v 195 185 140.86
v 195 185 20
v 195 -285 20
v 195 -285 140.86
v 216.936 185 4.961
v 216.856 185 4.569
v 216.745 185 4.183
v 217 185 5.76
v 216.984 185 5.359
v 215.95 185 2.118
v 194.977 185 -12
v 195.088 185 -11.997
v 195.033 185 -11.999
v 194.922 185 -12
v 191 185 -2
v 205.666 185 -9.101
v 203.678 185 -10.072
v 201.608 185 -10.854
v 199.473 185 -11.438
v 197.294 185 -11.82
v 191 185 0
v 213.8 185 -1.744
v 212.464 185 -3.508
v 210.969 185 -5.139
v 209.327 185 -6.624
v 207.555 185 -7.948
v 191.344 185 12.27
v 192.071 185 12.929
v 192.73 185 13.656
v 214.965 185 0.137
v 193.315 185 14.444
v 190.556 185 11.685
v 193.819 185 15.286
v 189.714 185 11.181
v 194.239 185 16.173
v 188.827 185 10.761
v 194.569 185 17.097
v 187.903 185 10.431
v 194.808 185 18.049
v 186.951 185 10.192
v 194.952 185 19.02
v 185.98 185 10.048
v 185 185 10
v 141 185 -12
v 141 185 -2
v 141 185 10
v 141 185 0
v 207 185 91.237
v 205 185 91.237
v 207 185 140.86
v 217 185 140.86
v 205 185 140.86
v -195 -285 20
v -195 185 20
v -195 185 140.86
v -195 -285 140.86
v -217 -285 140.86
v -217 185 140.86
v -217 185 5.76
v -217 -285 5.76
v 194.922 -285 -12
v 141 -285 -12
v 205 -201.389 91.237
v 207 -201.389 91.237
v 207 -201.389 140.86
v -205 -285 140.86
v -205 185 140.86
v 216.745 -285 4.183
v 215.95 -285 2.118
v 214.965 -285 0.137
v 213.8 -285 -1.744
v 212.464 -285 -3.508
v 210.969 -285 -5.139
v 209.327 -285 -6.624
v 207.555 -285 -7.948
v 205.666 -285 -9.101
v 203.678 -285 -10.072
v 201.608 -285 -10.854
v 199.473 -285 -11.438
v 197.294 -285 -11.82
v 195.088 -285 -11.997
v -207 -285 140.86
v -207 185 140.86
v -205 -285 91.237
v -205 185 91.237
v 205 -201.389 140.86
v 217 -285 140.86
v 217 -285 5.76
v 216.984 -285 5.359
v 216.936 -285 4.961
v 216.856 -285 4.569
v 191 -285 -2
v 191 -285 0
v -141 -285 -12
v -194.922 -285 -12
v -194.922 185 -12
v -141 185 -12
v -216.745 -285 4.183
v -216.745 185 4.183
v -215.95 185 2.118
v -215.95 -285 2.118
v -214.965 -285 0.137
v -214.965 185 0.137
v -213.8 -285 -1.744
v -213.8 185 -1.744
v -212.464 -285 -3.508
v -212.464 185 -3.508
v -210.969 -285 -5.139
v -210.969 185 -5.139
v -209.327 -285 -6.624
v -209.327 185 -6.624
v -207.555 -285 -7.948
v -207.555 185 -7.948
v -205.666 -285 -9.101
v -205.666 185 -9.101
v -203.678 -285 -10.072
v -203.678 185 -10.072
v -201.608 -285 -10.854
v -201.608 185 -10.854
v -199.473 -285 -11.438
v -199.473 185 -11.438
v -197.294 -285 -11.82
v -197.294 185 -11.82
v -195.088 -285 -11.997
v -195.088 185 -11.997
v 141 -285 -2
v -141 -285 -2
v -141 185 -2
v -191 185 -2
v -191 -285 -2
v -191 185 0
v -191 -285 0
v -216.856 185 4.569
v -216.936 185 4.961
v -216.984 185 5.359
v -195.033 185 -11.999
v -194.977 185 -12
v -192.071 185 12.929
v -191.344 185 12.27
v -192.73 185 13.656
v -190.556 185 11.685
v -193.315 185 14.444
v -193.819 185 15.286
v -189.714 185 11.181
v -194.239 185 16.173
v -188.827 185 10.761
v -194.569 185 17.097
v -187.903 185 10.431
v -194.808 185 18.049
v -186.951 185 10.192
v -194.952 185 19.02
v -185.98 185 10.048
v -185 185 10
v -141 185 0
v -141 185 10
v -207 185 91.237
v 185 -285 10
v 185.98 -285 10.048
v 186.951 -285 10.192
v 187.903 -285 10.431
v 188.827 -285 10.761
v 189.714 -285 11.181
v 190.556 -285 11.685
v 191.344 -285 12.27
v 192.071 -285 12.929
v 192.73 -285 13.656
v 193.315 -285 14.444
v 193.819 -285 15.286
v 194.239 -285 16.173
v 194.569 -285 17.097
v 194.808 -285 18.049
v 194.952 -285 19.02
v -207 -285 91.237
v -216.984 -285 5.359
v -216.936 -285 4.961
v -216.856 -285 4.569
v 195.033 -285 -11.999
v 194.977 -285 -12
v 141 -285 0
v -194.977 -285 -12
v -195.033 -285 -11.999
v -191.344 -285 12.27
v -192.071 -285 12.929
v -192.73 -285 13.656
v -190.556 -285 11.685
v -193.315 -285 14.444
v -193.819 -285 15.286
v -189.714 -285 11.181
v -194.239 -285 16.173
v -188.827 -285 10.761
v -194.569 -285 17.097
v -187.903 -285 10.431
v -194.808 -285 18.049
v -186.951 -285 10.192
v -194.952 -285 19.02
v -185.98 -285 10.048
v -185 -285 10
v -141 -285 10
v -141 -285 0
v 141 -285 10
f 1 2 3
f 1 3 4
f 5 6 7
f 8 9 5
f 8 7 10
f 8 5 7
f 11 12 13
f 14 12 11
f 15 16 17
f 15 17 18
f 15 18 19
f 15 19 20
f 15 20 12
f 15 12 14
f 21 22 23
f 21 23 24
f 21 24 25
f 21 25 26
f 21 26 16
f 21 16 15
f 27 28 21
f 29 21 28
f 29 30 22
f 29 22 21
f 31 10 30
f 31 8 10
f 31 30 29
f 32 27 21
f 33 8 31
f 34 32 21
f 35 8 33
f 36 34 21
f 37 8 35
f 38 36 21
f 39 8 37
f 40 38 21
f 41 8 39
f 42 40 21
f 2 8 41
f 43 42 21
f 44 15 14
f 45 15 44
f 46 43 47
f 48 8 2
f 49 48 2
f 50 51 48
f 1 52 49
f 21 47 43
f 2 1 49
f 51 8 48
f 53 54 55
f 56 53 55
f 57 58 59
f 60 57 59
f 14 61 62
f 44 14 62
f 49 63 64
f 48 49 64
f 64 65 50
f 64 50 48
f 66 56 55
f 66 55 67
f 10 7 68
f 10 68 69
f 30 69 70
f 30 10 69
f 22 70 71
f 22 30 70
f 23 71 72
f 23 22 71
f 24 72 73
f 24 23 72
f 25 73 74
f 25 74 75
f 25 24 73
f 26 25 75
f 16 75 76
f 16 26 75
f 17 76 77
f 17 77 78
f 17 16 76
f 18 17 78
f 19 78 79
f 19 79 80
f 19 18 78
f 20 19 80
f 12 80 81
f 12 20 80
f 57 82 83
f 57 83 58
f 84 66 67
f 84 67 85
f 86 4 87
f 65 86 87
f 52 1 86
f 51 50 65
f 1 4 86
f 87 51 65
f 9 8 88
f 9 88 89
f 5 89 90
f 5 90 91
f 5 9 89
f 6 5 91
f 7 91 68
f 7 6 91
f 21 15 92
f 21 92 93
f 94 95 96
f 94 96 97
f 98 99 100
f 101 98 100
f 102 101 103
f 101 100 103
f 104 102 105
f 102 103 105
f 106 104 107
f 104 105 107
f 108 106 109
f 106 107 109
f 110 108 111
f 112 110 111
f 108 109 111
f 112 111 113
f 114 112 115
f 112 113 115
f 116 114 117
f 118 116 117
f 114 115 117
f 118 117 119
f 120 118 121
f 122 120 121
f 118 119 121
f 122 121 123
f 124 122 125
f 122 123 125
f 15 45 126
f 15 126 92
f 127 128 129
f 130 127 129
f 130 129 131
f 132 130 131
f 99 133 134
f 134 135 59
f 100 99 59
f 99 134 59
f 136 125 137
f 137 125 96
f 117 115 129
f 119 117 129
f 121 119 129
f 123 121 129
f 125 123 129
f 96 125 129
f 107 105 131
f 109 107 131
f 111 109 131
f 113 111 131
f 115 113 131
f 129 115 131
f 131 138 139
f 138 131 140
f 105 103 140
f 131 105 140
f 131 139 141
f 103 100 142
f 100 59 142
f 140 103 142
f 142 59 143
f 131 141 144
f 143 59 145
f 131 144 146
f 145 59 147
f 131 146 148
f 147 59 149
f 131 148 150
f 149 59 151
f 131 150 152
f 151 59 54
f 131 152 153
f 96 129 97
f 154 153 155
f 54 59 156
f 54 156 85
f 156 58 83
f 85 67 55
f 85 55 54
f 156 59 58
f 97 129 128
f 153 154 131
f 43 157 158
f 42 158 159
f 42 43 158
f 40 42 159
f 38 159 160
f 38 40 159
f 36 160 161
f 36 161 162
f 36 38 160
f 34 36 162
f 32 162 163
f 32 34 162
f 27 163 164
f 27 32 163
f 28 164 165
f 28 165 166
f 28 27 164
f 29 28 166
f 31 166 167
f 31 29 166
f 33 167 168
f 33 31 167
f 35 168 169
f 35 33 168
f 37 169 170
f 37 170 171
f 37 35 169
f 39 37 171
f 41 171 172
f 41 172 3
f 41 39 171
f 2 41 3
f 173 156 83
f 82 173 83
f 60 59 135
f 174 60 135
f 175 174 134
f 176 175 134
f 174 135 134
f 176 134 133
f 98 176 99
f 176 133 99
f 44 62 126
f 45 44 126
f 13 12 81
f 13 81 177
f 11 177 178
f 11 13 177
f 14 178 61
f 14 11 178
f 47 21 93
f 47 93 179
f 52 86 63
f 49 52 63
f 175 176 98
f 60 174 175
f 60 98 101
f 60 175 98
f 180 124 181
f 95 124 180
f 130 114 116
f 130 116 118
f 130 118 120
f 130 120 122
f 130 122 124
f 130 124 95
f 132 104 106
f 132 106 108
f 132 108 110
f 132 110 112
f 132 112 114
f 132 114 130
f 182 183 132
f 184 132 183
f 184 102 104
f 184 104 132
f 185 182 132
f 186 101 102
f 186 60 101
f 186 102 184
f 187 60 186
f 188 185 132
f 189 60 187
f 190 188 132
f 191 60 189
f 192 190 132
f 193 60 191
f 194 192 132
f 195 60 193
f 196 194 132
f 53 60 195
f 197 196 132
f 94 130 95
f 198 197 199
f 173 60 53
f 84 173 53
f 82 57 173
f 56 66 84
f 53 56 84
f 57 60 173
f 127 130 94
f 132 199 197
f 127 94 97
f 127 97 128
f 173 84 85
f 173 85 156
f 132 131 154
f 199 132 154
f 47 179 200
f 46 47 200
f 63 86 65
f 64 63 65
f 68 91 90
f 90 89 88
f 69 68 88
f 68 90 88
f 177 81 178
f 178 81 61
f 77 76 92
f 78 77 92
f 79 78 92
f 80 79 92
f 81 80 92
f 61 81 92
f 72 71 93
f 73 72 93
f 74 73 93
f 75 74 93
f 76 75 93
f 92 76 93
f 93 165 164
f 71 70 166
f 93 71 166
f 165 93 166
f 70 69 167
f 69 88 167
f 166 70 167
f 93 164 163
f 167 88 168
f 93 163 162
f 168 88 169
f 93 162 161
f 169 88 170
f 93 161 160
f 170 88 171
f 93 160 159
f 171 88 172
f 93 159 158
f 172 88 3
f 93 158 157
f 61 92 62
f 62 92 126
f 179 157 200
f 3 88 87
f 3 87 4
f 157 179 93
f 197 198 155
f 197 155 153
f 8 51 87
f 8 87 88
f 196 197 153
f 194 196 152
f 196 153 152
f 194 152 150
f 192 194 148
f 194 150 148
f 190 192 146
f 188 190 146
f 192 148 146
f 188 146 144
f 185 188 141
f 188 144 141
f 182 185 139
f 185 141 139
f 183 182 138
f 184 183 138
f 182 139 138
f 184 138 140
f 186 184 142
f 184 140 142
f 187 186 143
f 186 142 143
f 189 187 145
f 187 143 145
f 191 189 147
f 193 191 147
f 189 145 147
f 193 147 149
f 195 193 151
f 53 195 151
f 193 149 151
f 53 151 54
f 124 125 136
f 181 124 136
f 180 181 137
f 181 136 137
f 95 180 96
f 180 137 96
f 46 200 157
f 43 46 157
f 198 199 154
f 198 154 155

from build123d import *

# Parameters (mm, degrees)
BOSS_EXTRUDE1_DEPTH   = 470
BOSS_EXTRUDE1_2_DEPTH = 470
CAVITY1_START         = -201.389246797
CAVITY1_OUTLINE_W     = 2
CAVITY1_OUTLINE_H     = 49.622691928
CAVITY1_DEPTH         = 386.389246797


# Read off the part's stored shape, not the designer's step: Cavity1
with BuildPart() as part:
    # Sketch1 → Boss-Extrude1 (new body)
    with BuildSketch(Plane.XZ.offset(-185)):
        with BuildLine():
            Line((141, 0), (141, 10))
            Line((141, 10), (185, 10))
            ThreePointArc((185, 10), (192.071067812, 12.928932188), (195, 20))
            Line((195, 20), (195, 140.859811782))
            Line((195, 140.859811782), (217, 140.859811782))
            Line((217, 140.859811782), (217, 5.759608647))
            ThreePointArc((217, 5.759608647), (216.935858368, 4.961296569), (216.745079131, 4.183466508))
            ThreePointArc((216.745079131, 4.183466508), (208.456598854, -7.306668645), (195.087954648, -11.997240382))
            ThreePointArc((195.087954648, -11.997240382), (195.004917078, -11.999310048), (194.921856585, -12))
            Line((194.921856585, -12), (141, -12))
            Line((141, -12), (141, -2))
            Line((141, -2), (191, -2))
            Line((191, -2), (191, 0))
            Line((191, 0), (141, 0))
        make_face()
    extrude(amount=BOSS_EXTRUDE1_DEPTH)

    # Cavity1 outline → Cavity1 (cut)
    with BuildSketch(Plane(origin=(0, 0, 0), x_dir=(1, 0, 0), z_dir=(0, 1, 0)).offset(CAVITY1_START)):
        with Locations((206, -116.048465818)):
            Rectangle(CAVITY1_OUTLINE_W, CAVITY1_OUTLINE_H)
    extrude(amount=CAVITY1_DEPTH, mode=Mode.SUBTRACT)


with BuildPart() as body_2:
    # Sketch1 → Boss-Extrude1 2 (new body)
    with BuildSketch(Plane.XZ.offset(-185)):
        with BuildLine():
            Line((-141, 10), (-185, 10))
            ThreePointArc((-185, 10), (-192.071067812, 12.928932188), (-195, 20))
            Line((-195, 20), (-195, 140.859811782))
            Line((-195, 140.859811782), (-205, 140.859811782))
            Line((-205, 140.859811782), (-205, 91.237119854))
            Line((-205, 91.237119854), (-207, 91.237119854))
            Line((-207, 91.237119854), (-207, 140.859811782))
            Line((-207, 140.859811782), (-217, 140.859811782))
            Line((-217, 140.859811782), (-217, 5.759608647))
            ThreePointArc((-217, 5.759608647), (-216.935858368, 4.961296569), (-216.745079131, 4.183466508))
            ThreePointArc((-216.745079131, 4.183466508), (-208.456598854, -7.306668645), (-195.087954648, -11.997240382))
            ThreePointArc((-195.087954648, -11.997240382), (-195.004917078, -11.999310048), (-194.921856585, -12))
            Line((-194.921856585, -12), (-141, -12))
            Line((-141, -12), (-141, -2))
            Line((-141, -2), (-191, -2))
            Line((-191, -2), (-191, 0))
            Line((-191, 0), (-141, 0))
            Line((-141, 0), (-141, 10))
        make_face()
    extrude(amount=BOSS_EXTRUDE1_2_DEPTH)


solid = Compound([part.part, body_2.part])
